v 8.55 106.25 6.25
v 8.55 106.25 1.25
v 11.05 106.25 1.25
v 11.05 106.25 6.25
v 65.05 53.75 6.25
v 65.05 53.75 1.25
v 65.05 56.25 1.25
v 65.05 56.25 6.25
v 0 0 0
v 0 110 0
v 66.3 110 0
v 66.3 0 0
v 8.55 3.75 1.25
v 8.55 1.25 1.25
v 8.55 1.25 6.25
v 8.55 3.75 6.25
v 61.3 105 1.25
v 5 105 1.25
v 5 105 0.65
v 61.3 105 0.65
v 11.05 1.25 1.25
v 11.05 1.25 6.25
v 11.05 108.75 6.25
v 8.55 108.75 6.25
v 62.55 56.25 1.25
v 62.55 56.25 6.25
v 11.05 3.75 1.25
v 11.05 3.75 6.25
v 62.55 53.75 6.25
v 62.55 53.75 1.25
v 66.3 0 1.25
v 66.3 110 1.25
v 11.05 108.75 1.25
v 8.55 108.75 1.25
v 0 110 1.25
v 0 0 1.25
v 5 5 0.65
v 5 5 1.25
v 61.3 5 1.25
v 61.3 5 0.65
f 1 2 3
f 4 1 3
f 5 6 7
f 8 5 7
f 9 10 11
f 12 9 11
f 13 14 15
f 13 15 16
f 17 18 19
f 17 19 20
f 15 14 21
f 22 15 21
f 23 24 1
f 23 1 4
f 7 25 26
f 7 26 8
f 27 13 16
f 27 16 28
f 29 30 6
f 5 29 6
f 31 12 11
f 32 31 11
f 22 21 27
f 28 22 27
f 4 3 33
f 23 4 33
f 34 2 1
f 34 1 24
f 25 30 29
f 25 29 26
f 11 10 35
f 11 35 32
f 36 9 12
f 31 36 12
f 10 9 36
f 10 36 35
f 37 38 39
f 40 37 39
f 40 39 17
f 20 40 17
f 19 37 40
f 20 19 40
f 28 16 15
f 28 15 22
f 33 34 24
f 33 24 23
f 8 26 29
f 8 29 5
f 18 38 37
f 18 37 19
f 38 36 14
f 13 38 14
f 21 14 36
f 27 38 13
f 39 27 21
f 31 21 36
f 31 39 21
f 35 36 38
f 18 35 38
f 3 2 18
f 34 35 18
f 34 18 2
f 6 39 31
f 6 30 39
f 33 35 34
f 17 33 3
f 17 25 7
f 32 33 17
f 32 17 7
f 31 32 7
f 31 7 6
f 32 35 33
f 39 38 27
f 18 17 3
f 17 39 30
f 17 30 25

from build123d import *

# Parameters (mm, degrees)
SKETCH1_W           = 66.3
SKETCH1_H           = 110
BOSS_EXTRUDE1_DEPTH = 1.25
SKETCH2_W           = 2.5
SKETCH2_H           = 2.5
BOSS_EXTRUDE2_DEPTH = 5
SKETCH3_W           = 56.3
SKETCH3_H           = 100
CUT_EXTRUDE1_DEPTH  = 0.6


with BuildPart() as part:
    # Sketch1 → Boss-Extrude1 (new body)
    with BuildSketch(Plane.XY):
        with Locations((33.15, 55)):
            Rectangle(SKETCH1_W, SKETCH1_H)
    extrude(amount=BOSS_EXTRUDE1_DEPTH)

    # Sketch2 → Boss-Extrude2 (add)
    with BuildSketch(Plane.XY.offset(1.25)):
        with Locations((9.8, 2.5)):
            Rectangle(SKETCH2_W, SKETCH2_H)
        with Locations((9.8, 107.5)):
            Rectangle(SKETCH2_W, SKETCH2_H)
        with Locations((63.8, 55)):
            Rectangle(SKETCH2_W, SKETCH2_H)
    extrude(amount=BOSS_EXTRUDE2_DEPTH)

    # Sketch3 → Cut-Extrude1 (cut)
    with BuildSketch(Plane.XY.offset(1.25)):
        with Locations((33.15, 55)):
            Rectangle(SKETCH3_W, SKETCH3_H)
    extrude(amount=-CUT_EXTRUDE1_DEPTH, mode=Mode.SUBTRACT)


solid = part.part
